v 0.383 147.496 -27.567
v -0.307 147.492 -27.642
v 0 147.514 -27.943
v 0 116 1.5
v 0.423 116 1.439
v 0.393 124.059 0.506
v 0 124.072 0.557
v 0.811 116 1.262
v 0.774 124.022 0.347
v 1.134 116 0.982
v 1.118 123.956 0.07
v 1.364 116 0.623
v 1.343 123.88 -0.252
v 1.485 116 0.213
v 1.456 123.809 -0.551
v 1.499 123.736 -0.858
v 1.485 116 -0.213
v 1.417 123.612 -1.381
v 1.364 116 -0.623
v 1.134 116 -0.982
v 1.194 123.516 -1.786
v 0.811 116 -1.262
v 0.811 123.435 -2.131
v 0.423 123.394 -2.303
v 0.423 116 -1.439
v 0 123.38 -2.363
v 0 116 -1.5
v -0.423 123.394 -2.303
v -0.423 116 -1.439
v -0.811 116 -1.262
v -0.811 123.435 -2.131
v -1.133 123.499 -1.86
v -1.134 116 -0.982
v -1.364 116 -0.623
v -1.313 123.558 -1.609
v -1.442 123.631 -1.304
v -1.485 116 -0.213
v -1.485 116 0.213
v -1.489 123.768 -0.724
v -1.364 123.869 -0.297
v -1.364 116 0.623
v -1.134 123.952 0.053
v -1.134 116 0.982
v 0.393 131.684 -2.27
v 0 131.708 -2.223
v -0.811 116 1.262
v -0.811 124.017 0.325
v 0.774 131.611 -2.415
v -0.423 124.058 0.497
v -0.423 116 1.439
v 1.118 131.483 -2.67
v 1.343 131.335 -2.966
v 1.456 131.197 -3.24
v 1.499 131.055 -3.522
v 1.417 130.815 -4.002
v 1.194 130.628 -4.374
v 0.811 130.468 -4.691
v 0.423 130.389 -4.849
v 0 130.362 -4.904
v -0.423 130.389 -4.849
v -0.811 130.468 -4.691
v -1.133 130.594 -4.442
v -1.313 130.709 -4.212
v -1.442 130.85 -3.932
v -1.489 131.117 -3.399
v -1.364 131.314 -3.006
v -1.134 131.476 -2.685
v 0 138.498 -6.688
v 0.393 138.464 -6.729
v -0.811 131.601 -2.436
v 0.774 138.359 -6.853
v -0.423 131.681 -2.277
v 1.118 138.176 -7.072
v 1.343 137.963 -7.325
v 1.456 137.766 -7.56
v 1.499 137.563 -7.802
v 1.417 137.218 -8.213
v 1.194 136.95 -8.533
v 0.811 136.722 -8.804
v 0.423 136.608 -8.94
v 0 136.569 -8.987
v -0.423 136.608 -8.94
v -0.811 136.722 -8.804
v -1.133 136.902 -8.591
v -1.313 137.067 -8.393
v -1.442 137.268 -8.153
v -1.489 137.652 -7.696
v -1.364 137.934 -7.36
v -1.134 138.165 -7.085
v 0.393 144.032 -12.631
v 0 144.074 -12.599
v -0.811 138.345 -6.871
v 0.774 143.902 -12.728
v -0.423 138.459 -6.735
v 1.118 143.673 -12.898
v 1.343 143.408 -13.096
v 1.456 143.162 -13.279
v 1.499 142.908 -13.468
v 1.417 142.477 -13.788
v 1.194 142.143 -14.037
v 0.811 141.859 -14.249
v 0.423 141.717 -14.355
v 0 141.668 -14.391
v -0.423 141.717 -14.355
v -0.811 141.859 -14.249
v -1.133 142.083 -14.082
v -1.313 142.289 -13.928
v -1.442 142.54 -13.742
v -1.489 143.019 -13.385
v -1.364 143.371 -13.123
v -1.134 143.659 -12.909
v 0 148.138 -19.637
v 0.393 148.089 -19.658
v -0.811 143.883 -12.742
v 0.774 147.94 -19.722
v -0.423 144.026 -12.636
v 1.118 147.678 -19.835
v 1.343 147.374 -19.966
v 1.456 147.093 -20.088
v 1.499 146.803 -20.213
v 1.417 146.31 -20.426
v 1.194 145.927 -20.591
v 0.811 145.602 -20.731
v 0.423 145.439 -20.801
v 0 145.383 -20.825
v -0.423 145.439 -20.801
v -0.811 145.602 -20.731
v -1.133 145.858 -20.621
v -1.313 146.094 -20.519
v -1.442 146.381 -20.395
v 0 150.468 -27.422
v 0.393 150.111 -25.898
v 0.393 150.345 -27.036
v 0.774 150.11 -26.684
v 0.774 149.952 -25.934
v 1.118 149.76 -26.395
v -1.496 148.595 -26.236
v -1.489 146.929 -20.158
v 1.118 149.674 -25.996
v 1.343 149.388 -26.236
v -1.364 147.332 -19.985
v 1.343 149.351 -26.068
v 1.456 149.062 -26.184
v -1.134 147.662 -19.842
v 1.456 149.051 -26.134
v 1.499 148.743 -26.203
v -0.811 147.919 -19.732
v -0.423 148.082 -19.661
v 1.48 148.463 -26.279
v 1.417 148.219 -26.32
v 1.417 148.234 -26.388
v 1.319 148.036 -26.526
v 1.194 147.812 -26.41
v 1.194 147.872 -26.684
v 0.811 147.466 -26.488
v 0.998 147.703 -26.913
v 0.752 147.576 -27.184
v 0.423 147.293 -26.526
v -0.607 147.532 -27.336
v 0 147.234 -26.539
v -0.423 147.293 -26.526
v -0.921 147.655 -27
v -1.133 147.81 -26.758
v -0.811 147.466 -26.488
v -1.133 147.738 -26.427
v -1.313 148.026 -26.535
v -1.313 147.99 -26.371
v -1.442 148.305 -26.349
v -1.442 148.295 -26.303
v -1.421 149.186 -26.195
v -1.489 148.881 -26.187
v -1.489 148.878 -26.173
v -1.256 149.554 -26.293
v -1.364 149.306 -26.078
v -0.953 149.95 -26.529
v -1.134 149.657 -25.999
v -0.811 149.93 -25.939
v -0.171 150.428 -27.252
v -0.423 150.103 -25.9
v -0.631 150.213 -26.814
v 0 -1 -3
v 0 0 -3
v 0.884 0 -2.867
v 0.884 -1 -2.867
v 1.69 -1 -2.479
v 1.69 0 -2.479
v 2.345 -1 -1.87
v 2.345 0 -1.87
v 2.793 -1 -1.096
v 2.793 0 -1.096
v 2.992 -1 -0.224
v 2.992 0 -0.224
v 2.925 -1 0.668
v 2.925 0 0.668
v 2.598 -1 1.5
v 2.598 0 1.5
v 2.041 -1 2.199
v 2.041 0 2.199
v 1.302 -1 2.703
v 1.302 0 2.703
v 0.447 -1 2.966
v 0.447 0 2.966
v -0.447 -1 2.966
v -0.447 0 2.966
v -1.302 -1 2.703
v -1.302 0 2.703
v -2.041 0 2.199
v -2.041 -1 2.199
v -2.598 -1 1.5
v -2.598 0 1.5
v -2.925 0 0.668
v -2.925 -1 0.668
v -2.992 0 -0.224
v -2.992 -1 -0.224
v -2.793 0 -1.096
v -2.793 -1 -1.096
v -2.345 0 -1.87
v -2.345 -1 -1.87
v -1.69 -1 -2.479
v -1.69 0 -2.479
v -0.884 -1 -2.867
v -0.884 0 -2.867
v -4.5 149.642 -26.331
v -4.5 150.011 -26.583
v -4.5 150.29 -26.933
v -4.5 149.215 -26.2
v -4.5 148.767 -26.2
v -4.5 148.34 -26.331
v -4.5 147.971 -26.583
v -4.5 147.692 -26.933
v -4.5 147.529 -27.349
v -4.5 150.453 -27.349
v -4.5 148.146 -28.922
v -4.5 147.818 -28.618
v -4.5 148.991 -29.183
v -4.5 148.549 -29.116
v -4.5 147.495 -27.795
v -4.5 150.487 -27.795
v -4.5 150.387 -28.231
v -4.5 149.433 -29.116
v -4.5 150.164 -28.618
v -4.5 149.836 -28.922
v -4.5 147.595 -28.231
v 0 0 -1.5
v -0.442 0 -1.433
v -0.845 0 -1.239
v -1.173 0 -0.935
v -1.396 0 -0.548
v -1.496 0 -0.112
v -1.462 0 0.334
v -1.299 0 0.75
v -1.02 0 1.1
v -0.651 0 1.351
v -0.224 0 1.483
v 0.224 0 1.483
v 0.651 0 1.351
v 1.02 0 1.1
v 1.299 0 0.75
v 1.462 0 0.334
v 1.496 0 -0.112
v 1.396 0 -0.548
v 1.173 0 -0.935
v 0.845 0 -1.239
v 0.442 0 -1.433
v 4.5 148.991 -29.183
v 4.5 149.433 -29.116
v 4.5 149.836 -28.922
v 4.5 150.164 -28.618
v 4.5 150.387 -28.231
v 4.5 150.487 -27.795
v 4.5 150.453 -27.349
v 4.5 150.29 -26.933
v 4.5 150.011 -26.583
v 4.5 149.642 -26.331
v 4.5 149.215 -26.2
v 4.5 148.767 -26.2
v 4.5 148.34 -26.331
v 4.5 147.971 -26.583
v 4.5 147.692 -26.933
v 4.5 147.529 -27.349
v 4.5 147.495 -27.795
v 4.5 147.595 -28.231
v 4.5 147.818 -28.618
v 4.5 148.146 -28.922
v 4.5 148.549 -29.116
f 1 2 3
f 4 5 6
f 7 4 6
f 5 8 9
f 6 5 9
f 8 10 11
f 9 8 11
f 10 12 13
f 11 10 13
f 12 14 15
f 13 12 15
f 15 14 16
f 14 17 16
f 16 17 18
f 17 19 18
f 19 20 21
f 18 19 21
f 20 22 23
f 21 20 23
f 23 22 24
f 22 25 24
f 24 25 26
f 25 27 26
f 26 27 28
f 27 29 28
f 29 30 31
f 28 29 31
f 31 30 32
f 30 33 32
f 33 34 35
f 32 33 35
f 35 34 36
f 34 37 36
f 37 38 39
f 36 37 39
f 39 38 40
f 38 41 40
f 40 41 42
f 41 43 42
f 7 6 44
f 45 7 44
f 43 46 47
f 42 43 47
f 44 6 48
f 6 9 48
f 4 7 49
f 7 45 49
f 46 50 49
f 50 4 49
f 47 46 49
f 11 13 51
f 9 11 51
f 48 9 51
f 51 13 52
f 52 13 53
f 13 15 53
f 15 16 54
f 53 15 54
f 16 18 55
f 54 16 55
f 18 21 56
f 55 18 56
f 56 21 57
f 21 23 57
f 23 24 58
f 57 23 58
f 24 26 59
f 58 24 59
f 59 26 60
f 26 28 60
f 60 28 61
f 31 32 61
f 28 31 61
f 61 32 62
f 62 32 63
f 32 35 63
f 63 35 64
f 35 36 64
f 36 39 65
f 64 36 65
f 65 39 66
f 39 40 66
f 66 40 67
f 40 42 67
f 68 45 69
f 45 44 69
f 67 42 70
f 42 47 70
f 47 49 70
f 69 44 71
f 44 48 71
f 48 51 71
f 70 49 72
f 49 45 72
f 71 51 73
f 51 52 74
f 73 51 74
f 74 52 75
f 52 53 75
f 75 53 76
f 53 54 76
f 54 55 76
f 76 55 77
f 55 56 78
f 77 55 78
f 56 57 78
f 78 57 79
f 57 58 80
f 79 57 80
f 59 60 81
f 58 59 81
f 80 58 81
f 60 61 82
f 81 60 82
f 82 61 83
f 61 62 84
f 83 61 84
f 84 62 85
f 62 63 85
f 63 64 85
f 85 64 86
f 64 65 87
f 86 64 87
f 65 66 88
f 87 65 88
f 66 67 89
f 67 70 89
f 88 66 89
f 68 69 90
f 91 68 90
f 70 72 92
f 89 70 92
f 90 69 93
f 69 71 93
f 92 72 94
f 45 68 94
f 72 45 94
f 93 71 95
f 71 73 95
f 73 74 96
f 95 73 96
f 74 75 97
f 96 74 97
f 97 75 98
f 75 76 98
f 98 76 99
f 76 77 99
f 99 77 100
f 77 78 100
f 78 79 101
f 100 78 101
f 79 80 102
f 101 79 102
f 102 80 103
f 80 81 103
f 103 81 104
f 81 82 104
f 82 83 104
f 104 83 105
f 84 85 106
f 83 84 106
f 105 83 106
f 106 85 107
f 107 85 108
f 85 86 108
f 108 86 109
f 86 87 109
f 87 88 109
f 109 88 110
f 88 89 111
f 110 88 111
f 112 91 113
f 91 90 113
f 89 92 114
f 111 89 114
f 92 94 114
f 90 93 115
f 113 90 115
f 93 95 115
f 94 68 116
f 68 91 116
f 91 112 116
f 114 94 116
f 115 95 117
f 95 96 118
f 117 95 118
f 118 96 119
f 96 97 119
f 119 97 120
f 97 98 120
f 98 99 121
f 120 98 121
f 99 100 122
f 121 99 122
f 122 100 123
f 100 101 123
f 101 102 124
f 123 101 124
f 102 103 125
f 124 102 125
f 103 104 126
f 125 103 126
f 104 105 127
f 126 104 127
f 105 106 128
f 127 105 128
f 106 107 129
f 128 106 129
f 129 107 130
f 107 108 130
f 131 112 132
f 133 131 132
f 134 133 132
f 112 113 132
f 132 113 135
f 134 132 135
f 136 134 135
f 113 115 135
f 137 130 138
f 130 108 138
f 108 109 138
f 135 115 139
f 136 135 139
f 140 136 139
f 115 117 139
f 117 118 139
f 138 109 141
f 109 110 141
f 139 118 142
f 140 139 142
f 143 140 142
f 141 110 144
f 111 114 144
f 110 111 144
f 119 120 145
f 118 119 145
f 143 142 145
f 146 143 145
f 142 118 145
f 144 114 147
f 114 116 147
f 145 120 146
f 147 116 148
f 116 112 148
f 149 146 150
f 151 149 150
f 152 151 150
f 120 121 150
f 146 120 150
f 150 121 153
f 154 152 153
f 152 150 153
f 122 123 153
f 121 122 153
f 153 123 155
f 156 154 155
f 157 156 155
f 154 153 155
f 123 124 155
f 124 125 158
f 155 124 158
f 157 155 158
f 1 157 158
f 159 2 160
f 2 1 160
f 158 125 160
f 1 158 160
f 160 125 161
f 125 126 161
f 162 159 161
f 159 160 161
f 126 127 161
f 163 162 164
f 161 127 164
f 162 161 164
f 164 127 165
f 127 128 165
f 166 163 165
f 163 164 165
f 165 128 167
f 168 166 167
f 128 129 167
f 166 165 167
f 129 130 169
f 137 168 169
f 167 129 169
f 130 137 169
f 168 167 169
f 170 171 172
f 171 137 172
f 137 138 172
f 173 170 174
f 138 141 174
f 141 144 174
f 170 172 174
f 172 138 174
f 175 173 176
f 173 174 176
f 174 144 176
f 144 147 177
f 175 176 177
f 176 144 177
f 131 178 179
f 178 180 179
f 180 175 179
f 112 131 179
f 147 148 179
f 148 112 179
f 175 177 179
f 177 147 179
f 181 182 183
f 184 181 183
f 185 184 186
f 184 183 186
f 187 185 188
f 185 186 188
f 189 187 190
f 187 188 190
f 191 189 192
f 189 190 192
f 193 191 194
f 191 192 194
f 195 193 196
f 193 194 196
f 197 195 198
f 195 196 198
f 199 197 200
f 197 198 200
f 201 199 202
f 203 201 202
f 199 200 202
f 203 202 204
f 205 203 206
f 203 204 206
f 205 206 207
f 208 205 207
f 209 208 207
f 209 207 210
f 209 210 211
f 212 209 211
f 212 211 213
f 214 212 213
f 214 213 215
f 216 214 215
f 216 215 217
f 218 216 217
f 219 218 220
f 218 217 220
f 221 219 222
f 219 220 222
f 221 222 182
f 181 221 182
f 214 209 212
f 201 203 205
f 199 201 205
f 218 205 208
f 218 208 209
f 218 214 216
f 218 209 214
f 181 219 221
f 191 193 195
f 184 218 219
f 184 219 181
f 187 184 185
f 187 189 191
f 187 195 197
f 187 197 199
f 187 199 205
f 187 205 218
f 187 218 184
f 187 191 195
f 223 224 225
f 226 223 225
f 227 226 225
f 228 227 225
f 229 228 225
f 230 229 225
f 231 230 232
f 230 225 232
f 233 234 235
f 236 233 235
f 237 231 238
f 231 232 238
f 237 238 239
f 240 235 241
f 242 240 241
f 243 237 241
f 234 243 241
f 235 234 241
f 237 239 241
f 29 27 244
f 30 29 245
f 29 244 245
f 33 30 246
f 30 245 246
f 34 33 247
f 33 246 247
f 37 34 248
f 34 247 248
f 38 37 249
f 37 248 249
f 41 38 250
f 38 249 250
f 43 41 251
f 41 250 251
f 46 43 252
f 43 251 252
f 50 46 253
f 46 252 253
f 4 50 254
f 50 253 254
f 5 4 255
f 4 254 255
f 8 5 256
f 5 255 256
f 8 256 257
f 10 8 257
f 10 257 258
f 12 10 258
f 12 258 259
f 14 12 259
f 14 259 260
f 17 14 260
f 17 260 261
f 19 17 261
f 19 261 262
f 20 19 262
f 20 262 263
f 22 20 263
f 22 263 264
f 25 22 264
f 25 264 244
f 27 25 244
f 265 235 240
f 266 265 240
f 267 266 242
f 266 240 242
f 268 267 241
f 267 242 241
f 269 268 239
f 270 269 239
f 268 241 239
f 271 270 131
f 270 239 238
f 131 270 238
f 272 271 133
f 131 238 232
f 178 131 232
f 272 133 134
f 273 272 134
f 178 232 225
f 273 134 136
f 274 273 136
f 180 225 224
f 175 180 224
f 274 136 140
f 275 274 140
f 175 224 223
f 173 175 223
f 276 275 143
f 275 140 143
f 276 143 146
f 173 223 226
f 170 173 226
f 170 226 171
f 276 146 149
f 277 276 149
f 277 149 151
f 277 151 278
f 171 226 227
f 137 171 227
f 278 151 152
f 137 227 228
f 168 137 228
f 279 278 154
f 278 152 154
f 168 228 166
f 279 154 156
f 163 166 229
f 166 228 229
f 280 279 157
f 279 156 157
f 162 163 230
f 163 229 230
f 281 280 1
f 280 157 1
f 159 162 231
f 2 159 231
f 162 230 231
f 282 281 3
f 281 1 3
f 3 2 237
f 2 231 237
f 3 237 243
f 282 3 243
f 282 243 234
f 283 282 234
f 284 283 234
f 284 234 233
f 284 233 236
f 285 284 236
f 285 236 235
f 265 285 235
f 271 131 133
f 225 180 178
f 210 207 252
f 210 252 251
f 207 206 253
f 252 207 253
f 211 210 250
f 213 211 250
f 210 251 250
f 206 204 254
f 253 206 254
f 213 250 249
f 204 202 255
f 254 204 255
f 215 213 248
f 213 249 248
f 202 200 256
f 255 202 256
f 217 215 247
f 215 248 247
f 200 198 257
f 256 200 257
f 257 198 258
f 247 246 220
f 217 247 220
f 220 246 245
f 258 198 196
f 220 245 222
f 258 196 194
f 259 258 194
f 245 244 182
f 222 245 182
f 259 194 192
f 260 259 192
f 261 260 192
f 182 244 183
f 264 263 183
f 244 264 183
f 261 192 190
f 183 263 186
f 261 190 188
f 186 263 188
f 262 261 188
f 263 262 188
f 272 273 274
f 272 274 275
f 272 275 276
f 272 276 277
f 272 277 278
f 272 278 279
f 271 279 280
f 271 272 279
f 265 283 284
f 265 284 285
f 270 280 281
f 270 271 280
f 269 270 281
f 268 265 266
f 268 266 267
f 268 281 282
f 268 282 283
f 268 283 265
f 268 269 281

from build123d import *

# Parameters (mm, degrees)
SKETCH1_R                = 1.5
BOSS_EXTRUDE1_DEPTH      = 116
SKETCH4_R                = 3
BOSS_EXTRUDE4_DEPTH      = 1
SKETCH7_R                = 1.5000000000000002
REVOLVE1_ANGLE           = 80.00000000000017
BOSS_EXTRUDE5_DEPTH      = 4.5
BOSS_EXTRUDE5_DEPTH_BACK = 4.5
SKETCH8_R                = 1.5000000000000009


with BuildPart() as part:
    # Sketch1 → Boss-Extrude1 (new body)
    with BuildSketch(Plane(origin=(0, 0, 0), x_dir=(1, 0, 0), z_dir=(0, 1, 0))):
        Circle(SKETCH1_R)
    extrude(amount=BOSS_EXTRUDE1_DEPTH)

    # Sketch4 → Boss-Extrude4 (add)
    with BuildSketch(Plane.XZ):
        Circle(SKETCH4_R)
    extrude(amount=BOSS_EXTRUDE4_DEPTH)

    # Sketch7 → Revolve1 (revolve)
    with BuildSketch(Plane(origin=(0, 116, 0), x_dir=(1, 0, 0), z_dir=(0, 1, 0))):
        Circle(SKETCH7_R)
    revolve(axis=Axis((-42.51012264816653, 116, -33.49999999999999), (-1, 0, 8e-17)), revolution_arc=REVOLVE1_ANGLE)

    # Sketch8 → Boss-Extrude5 (add, two sides: drawn at the far end of the back side and taken through both)
    with BuildSketch(Plane(origin=(0, 0, 0), x_dir=(0, 0, -1), z_dir=(1, 0, 0)).offset(-BOSS_EXTRUDE5_DEPTH_BACK)):
        with Locations((27.682786048157936, 148.99105972590897)):
            Circle(SKETCH8_R)
    extrude(amount=BOSS_EXTRUDE5_DEPTH + BOSS_EXTRUDE5_DEPTH_BACK)


solid = part.part
